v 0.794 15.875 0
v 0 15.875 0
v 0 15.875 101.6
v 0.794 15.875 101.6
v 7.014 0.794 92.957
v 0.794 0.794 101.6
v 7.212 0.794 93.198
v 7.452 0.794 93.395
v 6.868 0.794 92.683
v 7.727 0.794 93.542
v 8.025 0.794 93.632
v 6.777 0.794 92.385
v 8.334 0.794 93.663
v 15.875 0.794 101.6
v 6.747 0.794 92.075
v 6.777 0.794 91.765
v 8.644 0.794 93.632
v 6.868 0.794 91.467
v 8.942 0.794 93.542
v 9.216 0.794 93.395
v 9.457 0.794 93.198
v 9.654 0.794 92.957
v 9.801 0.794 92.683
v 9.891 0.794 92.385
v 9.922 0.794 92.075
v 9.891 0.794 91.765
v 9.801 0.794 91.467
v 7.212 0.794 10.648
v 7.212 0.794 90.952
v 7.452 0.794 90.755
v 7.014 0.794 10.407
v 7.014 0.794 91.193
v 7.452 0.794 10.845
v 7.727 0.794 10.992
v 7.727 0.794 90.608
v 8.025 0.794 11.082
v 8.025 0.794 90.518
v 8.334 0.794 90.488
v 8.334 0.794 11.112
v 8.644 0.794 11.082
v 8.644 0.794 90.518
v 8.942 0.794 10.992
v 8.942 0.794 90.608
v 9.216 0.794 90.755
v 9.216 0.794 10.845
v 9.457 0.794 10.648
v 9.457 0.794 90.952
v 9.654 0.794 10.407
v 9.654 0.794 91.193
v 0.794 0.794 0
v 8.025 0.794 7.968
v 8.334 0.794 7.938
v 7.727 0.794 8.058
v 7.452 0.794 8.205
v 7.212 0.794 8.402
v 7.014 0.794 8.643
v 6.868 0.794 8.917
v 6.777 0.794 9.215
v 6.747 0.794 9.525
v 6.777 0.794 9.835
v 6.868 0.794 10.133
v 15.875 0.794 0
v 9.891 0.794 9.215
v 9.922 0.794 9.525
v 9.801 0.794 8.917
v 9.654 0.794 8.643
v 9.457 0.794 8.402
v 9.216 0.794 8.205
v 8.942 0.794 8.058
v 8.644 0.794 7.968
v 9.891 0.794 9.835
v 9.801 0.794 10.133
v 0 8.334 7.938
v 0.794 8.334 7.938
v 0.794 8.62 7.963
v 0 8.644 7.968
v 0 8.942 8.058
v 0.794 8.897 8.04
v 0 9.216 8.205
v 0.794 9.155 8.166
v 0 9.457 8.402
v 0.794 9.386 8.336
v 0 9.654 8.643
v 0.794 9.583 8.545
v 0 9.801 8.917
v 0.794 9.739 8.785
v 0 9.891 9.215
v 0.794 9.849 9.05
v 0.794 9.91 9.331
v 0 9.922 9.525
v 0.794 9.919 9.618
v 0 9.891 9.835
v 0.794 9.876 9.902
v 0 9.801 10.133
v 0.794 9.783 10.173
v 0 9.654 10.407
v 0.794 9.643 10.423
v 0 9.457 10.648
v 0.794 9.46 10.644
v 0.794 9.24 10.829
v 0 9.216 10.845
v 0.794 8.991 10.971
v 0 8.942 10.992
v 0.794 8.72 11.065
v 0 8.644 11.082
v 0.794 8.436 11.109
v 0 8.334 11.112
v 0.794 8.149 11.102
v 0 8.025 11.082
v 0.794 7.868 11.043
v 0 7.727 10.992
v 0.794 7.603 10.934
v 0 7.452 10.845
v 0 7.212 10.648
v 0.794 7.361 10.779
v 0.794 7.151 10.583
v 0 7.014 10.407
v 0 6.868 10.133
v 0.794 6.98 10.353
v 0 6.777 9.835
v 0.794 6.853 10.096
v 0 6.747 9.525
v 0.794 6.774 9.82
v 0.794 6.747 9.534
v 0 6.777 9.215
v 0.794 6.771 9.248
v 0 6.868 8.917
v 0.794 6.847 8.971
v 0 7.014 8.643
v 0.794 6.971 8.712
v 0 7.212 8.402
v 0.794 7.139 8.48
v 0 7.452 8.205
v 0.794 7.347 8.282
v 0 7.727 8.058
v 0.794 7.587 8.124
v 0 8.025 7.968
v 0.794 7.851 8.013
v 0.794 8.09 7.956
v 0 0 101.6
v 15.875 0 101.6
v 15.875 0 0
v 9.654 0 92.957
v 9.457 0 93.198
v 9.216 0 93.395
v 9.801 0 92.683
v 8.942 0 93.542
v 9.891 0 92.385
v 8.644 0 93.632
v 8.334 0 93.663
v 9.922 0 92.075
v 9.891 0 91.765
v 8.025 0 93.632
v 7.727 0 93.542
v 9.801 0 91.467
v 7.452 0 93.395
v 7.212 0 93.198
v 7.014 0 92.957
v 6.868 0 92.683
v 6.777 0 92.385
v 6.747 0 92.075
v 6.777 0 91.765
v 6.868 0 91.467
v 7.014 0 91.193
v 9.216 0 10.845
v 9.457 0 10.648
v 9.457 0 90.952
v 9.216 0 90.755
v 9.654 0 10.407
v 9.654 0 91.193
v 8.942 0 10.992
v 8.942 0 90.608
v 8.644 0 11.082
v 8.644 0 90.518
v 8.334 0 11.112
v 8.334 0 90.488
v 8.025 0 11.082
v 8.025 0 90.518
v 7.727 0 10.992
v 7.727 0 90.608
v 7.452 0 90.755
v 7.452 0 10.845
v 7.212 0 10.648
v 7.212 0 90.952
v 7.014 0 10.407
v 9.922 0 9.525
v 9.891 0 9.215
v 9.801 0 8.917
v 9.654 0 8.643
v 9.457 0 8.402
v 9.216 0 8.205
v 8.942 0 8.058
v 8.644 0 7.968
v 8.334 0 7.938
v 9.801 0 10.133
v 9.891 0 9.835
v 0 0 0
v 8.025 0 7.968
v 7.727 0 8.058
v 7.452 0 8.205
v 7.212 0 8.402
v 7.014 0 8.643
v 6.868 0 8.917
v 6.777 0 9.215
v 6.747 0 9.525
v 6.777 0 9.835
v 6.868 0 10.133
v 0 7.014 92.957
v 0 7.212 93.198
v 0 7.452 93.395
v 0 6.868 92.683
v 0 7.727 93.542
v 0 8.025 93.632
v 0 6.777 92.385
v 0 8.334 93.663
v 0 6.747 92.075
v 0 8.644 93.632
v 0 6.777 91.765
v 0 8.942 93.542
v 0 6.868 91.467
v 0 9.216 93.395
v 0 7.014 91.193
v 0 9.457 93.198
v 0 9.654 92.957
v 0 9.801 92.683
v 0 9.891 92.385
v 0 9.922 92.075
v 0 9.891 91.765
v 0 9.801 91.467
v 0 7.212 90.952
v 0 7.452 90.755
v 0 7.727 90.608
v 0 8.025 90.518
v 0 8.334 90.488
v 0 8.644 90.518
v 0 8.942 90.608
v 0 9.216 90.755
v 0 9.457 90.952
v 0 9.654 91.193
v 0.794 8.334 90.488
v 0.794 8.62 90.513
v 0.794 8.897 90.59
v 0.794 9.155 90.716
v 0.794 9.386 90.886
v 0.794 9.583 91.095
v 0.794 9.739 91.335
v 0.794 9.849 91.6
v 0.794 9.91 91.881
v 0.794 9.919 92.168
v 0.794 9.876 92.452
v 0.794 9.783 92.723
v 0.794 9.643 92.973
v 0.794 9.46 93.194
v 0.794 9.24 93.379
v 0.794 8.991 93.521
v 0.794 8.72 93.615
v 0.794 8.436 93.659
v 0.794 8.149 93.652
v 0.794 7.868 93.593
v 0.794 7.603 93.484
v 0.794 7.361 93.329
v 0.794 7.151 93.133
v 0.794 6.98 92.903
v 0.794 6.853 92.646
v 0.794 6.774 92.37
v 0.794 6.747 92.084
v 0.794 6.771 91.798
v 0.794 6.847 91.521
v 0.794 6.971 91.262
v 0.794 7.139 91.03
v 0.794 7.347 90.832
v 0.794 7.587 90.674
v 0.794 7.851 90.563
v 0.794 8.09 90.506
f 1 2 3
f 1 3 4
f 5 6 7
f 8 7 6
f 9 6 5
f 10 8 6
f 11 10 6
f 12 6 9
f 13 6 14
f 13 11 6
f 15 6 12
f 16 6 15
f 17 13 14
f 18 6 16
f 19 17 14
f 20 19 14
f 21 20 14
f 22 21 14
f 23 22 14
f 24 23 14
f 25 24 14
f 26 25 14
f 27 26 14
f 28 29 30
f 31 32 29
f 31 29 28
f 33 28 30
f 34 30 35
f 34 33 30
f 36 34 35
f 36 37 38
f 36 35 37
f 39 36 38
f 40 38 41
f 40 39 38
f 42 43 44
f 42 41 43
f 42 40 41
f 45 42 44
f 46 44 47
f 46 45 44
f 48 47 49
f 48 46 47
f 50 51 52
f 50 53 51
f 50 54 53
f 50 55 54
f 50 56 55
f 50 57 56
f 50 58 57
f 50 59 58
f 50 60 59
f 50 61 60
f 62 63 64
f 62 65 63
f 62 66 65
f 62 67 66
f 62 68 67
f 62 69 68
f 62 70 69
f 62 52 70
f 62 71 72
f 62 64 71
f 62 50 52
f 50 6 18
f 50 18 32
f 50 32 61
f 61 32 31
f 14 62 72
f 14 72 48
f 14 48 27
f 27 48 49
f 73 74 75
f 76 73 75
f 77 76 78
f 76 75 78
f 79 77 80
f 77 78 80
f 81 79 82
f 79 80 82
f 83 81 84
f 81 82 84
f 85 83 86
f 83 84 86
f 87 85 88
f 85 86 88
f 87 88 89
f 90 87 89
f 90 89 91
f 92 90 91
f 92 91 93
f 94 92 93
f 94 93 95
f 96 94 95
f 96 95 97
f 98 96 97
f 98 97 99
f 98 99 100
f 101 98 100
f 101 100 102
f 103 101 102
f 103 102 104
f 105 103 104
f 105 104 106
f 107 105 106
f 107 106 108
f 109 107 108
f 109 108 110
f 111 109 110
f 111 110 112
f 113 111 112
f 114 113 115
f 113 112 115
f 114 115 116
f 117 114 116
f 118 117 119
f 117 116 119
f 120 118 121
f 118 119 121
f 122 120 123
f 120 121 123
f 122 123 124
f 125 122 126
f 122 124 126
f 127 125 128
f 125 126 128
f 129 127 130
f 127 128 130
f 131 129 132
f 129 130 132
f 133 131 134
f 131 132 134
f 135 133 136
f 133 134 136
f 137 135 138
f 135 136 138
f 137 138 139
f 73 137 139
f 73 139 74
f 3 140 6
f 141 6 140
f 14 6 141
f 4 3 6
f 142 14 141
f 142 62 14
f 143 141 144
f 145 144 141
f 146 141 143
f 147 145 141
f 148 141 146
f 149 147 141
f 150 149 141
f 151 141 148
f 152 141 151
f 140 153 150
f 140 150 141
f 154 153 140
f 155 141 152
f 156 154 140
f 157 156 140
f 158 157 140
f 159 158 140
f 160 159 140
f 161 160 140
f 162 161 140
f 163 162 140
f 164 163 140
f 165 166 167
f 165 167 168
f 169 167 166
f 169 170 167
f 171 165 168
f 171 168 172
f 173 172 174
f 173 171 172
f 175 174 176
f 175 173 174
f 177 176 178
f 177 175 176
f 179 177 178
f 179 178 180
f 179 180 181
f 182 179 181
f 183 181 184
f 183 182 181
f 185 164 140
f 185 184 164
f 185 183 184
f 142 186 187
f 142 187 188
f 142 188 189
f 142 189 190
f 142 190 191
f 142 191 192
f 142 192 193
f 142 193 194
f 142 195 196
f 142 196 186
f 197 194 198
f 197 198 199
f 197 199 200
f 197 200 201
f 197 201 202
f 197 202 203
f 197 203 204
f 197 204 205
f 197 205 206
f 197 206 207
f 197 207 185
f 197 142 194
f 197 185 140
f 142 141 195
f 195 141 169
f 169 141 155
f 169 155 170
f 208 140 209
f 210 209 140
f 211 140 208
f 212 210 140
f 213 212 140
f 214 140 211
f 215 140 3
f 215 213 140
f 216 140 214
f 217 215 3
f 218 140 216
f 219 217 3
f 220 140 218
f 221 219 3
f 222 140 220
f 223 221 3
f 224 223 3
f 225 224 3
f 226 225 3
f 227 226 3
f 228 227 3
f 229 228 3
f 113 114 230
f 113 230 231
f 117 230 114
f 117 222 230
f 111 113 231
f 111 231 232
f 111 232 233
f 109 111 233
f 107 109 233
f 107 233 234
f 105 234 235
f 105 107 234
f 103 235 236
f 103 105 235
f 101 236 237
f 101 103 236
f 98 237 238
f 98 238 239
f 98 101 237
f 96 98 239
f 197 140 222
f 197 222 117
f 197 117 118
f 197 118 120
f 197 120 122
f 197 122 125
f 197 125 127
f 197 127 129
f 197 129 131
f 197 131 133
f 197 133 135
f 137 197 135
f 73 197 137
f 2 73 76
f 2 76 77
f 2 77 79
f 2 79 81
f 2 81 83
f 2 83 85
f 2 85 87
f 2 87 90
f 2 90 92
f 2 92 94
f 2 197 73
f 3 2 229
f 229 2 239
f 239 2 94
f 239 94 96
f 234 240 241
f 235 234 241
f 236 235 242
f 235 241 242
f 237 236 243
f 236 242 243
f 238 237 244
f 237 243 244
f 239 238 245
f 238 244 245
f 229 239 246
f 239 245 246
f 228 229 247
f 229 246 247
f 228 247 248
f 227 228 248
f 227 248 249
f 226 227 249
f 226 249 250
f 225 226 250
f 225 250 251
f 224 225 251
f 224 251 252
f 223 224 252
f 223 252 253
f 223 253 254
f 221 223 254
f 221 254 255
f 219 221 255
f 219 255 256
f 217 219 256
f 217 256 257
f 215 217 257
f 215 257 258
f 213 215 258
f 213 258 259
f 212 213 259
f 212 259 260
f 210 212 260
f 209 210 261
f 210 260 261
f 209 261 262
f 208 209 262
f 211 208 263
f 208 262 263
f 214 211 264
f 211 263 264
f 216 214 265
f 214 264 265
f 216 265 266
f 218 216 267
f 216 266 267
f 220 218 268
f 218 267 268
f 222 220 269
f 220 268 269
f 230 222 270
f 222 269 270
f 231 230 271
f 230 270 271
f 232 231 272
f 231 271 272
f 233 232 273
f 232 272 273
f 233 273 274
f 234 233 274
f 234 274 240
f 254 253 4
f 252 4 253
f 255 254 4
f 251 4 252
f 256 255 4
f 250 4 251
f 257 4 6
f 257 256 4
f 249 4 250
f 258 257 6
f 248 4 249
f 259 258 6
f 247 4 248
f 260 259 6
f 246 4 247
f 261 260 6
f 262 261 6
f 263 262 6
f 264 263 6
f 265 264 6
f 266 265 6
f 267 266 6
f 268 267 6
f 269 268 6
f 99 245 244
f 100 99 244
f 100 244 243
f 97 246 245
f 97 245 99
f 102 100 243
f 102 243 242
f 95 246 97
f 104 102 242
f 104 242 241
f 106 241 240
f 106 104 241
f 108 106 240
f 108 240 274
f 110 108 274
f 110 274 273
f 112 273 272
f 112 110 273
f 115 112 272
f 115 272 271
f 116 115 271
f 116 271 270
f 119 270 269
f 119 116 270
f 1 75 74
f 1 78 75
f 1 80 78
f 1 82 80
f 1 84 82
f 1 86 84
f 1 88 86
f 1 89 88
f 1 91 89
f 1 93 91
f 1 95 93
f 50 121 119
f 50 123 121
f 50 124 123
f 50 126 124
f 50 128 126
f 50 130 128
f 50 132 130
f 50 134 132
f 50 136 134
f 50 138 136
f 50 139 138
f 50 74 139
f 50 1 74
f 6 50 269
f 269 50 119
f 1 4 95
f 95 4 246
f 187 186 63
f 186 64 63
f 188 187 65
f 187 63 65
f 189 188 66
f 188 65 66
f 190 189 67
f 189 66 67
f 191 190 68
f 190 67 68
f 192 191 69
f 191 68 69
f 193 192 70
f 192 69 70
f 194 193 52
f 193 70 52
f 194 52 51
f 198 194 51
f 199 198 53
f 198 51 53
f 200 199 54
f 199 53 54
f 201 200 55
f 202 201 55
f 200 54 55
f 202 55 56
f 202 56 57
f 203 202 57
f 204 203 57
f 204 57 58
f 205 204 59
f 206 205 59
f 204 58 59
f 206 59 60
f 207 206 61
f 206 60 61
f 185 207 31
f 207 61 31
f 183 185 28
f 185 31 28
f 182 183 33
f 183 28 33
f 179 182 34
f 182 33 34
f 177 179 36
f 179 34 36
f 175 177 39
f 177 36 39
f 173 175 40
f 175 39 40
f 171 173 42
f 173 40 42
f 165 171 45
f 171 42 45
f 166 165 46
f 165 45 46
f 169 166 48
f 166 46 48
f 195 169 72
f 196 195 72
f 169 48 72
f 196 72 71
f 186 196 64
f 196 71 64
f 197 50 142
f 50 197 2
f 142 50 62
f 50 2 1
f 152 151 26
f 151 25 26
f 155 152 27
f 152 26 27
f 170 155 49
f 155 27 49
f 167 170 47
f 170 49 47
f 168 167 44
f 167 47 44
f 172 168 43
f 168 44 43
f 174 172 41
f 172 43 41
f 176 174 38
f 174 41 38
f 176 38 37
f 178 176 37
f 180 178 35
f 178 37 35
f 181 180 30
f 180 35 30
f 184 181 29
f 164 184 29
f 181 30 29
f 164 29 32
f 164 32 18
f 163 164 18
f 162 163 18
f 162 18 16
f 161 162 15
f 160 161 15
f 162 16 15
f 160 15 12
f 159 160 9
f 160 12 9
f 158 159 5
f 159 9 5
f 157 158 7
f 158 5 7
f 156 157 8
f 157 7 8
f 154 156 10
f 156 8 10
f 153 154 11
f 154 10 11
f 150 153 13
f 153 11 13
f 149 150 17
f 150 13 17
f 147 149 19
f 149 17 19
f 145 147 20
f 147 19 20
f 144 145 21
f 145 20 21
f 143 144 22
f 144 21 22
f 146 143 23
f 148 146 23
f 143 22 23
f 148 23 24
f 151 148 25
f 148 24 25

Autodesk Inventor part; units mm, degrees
ref_plane "YZ Plane" through (0, 0, 0) normal (1, 0, 0) x (0, 1, 0)
ref_plane "XZ Plane" through (0, 0, 0) normal (0, 1, 0) x (-1, 0, 0)
ref_plane "XY Plane" through (0, 0, 0) normal (0, 0, 1) x (1, 0, 0)
sketch "Sketch1" plane through (0, 0, 0) normal (0, 0, 1) x (1, 0, 0)
  line L0 (0, 0) -> (0, 15.875)
  line L1 (0, 15.875) -> (0.7937, 15.875)
  line L2 (0.7937, 15.875) -> (0.7938, 0.7937)
  line L3 (0.7938, 0.7937) -> (15.875, 0.7937)
  line L4 (15.875, 0.7937) -> (15.875, 0)
  line L5 (15.875, 0) -> (0, 0)
  dimension "d0" = 15.875
  dimension "d1" = 0.7937
extrude "Extrusion1" add sketch "Sketch1" along normal blind 101.6
sketch "Sketch2" plane through (0.7938, 0.7937, 0) normal (0, 1, 0) x (1, 0, 0)
  line L0 (0, 0) -> (15.0812, 0) projected
  line L1 (15.0812, -101.6) -> (0, -101.6) projected
  line L2 (7.5406, 0) -> (7.5406, -101.6) construction
  circle A0 centre (7.5406, -9.525) radius 1.5875
  circle A1 centre (7.5406, -92.075) radius 1.5875
  point P0 (-0.7938, 0)
  dimension "d4" = 9.525
  dimension "d5" = 3.175
  dimension "d6" = 101.6
  dimension "d9" = 82.55
sketch "Sketch3" plane through (0.7938, 0.7937, 0) normal (1, 0, 0) x (0, 0, -1)
  line L0 (0, 15.0812) -> (0, 0) projected
  line L1 (-101.6, 0) -> (-101.6, 15.0812) projected
  line L2 (-101.6, 7.5406) -> (0, 7.5406) construction
  circle A0 centre (-9.525, 7.5406) radius 1.5875
  circle A1 centre (-92.075, 7.5406) radius 1.5875
  point P0 (0, -0.7937)
  dimension "d14" = 3.175
  dimension "d15" = 9.525
  dimension "d16" = 101.6
  dimension "d19" = 82.55
extrude "Extrusion2" cut sketch "Sketch2" against normal through all
extrude "Extrusion3" cut sketch "Sketch3" against normal through all
properties part number "Hopper Bracing Front Right P7" material "Aluminum 6061"
